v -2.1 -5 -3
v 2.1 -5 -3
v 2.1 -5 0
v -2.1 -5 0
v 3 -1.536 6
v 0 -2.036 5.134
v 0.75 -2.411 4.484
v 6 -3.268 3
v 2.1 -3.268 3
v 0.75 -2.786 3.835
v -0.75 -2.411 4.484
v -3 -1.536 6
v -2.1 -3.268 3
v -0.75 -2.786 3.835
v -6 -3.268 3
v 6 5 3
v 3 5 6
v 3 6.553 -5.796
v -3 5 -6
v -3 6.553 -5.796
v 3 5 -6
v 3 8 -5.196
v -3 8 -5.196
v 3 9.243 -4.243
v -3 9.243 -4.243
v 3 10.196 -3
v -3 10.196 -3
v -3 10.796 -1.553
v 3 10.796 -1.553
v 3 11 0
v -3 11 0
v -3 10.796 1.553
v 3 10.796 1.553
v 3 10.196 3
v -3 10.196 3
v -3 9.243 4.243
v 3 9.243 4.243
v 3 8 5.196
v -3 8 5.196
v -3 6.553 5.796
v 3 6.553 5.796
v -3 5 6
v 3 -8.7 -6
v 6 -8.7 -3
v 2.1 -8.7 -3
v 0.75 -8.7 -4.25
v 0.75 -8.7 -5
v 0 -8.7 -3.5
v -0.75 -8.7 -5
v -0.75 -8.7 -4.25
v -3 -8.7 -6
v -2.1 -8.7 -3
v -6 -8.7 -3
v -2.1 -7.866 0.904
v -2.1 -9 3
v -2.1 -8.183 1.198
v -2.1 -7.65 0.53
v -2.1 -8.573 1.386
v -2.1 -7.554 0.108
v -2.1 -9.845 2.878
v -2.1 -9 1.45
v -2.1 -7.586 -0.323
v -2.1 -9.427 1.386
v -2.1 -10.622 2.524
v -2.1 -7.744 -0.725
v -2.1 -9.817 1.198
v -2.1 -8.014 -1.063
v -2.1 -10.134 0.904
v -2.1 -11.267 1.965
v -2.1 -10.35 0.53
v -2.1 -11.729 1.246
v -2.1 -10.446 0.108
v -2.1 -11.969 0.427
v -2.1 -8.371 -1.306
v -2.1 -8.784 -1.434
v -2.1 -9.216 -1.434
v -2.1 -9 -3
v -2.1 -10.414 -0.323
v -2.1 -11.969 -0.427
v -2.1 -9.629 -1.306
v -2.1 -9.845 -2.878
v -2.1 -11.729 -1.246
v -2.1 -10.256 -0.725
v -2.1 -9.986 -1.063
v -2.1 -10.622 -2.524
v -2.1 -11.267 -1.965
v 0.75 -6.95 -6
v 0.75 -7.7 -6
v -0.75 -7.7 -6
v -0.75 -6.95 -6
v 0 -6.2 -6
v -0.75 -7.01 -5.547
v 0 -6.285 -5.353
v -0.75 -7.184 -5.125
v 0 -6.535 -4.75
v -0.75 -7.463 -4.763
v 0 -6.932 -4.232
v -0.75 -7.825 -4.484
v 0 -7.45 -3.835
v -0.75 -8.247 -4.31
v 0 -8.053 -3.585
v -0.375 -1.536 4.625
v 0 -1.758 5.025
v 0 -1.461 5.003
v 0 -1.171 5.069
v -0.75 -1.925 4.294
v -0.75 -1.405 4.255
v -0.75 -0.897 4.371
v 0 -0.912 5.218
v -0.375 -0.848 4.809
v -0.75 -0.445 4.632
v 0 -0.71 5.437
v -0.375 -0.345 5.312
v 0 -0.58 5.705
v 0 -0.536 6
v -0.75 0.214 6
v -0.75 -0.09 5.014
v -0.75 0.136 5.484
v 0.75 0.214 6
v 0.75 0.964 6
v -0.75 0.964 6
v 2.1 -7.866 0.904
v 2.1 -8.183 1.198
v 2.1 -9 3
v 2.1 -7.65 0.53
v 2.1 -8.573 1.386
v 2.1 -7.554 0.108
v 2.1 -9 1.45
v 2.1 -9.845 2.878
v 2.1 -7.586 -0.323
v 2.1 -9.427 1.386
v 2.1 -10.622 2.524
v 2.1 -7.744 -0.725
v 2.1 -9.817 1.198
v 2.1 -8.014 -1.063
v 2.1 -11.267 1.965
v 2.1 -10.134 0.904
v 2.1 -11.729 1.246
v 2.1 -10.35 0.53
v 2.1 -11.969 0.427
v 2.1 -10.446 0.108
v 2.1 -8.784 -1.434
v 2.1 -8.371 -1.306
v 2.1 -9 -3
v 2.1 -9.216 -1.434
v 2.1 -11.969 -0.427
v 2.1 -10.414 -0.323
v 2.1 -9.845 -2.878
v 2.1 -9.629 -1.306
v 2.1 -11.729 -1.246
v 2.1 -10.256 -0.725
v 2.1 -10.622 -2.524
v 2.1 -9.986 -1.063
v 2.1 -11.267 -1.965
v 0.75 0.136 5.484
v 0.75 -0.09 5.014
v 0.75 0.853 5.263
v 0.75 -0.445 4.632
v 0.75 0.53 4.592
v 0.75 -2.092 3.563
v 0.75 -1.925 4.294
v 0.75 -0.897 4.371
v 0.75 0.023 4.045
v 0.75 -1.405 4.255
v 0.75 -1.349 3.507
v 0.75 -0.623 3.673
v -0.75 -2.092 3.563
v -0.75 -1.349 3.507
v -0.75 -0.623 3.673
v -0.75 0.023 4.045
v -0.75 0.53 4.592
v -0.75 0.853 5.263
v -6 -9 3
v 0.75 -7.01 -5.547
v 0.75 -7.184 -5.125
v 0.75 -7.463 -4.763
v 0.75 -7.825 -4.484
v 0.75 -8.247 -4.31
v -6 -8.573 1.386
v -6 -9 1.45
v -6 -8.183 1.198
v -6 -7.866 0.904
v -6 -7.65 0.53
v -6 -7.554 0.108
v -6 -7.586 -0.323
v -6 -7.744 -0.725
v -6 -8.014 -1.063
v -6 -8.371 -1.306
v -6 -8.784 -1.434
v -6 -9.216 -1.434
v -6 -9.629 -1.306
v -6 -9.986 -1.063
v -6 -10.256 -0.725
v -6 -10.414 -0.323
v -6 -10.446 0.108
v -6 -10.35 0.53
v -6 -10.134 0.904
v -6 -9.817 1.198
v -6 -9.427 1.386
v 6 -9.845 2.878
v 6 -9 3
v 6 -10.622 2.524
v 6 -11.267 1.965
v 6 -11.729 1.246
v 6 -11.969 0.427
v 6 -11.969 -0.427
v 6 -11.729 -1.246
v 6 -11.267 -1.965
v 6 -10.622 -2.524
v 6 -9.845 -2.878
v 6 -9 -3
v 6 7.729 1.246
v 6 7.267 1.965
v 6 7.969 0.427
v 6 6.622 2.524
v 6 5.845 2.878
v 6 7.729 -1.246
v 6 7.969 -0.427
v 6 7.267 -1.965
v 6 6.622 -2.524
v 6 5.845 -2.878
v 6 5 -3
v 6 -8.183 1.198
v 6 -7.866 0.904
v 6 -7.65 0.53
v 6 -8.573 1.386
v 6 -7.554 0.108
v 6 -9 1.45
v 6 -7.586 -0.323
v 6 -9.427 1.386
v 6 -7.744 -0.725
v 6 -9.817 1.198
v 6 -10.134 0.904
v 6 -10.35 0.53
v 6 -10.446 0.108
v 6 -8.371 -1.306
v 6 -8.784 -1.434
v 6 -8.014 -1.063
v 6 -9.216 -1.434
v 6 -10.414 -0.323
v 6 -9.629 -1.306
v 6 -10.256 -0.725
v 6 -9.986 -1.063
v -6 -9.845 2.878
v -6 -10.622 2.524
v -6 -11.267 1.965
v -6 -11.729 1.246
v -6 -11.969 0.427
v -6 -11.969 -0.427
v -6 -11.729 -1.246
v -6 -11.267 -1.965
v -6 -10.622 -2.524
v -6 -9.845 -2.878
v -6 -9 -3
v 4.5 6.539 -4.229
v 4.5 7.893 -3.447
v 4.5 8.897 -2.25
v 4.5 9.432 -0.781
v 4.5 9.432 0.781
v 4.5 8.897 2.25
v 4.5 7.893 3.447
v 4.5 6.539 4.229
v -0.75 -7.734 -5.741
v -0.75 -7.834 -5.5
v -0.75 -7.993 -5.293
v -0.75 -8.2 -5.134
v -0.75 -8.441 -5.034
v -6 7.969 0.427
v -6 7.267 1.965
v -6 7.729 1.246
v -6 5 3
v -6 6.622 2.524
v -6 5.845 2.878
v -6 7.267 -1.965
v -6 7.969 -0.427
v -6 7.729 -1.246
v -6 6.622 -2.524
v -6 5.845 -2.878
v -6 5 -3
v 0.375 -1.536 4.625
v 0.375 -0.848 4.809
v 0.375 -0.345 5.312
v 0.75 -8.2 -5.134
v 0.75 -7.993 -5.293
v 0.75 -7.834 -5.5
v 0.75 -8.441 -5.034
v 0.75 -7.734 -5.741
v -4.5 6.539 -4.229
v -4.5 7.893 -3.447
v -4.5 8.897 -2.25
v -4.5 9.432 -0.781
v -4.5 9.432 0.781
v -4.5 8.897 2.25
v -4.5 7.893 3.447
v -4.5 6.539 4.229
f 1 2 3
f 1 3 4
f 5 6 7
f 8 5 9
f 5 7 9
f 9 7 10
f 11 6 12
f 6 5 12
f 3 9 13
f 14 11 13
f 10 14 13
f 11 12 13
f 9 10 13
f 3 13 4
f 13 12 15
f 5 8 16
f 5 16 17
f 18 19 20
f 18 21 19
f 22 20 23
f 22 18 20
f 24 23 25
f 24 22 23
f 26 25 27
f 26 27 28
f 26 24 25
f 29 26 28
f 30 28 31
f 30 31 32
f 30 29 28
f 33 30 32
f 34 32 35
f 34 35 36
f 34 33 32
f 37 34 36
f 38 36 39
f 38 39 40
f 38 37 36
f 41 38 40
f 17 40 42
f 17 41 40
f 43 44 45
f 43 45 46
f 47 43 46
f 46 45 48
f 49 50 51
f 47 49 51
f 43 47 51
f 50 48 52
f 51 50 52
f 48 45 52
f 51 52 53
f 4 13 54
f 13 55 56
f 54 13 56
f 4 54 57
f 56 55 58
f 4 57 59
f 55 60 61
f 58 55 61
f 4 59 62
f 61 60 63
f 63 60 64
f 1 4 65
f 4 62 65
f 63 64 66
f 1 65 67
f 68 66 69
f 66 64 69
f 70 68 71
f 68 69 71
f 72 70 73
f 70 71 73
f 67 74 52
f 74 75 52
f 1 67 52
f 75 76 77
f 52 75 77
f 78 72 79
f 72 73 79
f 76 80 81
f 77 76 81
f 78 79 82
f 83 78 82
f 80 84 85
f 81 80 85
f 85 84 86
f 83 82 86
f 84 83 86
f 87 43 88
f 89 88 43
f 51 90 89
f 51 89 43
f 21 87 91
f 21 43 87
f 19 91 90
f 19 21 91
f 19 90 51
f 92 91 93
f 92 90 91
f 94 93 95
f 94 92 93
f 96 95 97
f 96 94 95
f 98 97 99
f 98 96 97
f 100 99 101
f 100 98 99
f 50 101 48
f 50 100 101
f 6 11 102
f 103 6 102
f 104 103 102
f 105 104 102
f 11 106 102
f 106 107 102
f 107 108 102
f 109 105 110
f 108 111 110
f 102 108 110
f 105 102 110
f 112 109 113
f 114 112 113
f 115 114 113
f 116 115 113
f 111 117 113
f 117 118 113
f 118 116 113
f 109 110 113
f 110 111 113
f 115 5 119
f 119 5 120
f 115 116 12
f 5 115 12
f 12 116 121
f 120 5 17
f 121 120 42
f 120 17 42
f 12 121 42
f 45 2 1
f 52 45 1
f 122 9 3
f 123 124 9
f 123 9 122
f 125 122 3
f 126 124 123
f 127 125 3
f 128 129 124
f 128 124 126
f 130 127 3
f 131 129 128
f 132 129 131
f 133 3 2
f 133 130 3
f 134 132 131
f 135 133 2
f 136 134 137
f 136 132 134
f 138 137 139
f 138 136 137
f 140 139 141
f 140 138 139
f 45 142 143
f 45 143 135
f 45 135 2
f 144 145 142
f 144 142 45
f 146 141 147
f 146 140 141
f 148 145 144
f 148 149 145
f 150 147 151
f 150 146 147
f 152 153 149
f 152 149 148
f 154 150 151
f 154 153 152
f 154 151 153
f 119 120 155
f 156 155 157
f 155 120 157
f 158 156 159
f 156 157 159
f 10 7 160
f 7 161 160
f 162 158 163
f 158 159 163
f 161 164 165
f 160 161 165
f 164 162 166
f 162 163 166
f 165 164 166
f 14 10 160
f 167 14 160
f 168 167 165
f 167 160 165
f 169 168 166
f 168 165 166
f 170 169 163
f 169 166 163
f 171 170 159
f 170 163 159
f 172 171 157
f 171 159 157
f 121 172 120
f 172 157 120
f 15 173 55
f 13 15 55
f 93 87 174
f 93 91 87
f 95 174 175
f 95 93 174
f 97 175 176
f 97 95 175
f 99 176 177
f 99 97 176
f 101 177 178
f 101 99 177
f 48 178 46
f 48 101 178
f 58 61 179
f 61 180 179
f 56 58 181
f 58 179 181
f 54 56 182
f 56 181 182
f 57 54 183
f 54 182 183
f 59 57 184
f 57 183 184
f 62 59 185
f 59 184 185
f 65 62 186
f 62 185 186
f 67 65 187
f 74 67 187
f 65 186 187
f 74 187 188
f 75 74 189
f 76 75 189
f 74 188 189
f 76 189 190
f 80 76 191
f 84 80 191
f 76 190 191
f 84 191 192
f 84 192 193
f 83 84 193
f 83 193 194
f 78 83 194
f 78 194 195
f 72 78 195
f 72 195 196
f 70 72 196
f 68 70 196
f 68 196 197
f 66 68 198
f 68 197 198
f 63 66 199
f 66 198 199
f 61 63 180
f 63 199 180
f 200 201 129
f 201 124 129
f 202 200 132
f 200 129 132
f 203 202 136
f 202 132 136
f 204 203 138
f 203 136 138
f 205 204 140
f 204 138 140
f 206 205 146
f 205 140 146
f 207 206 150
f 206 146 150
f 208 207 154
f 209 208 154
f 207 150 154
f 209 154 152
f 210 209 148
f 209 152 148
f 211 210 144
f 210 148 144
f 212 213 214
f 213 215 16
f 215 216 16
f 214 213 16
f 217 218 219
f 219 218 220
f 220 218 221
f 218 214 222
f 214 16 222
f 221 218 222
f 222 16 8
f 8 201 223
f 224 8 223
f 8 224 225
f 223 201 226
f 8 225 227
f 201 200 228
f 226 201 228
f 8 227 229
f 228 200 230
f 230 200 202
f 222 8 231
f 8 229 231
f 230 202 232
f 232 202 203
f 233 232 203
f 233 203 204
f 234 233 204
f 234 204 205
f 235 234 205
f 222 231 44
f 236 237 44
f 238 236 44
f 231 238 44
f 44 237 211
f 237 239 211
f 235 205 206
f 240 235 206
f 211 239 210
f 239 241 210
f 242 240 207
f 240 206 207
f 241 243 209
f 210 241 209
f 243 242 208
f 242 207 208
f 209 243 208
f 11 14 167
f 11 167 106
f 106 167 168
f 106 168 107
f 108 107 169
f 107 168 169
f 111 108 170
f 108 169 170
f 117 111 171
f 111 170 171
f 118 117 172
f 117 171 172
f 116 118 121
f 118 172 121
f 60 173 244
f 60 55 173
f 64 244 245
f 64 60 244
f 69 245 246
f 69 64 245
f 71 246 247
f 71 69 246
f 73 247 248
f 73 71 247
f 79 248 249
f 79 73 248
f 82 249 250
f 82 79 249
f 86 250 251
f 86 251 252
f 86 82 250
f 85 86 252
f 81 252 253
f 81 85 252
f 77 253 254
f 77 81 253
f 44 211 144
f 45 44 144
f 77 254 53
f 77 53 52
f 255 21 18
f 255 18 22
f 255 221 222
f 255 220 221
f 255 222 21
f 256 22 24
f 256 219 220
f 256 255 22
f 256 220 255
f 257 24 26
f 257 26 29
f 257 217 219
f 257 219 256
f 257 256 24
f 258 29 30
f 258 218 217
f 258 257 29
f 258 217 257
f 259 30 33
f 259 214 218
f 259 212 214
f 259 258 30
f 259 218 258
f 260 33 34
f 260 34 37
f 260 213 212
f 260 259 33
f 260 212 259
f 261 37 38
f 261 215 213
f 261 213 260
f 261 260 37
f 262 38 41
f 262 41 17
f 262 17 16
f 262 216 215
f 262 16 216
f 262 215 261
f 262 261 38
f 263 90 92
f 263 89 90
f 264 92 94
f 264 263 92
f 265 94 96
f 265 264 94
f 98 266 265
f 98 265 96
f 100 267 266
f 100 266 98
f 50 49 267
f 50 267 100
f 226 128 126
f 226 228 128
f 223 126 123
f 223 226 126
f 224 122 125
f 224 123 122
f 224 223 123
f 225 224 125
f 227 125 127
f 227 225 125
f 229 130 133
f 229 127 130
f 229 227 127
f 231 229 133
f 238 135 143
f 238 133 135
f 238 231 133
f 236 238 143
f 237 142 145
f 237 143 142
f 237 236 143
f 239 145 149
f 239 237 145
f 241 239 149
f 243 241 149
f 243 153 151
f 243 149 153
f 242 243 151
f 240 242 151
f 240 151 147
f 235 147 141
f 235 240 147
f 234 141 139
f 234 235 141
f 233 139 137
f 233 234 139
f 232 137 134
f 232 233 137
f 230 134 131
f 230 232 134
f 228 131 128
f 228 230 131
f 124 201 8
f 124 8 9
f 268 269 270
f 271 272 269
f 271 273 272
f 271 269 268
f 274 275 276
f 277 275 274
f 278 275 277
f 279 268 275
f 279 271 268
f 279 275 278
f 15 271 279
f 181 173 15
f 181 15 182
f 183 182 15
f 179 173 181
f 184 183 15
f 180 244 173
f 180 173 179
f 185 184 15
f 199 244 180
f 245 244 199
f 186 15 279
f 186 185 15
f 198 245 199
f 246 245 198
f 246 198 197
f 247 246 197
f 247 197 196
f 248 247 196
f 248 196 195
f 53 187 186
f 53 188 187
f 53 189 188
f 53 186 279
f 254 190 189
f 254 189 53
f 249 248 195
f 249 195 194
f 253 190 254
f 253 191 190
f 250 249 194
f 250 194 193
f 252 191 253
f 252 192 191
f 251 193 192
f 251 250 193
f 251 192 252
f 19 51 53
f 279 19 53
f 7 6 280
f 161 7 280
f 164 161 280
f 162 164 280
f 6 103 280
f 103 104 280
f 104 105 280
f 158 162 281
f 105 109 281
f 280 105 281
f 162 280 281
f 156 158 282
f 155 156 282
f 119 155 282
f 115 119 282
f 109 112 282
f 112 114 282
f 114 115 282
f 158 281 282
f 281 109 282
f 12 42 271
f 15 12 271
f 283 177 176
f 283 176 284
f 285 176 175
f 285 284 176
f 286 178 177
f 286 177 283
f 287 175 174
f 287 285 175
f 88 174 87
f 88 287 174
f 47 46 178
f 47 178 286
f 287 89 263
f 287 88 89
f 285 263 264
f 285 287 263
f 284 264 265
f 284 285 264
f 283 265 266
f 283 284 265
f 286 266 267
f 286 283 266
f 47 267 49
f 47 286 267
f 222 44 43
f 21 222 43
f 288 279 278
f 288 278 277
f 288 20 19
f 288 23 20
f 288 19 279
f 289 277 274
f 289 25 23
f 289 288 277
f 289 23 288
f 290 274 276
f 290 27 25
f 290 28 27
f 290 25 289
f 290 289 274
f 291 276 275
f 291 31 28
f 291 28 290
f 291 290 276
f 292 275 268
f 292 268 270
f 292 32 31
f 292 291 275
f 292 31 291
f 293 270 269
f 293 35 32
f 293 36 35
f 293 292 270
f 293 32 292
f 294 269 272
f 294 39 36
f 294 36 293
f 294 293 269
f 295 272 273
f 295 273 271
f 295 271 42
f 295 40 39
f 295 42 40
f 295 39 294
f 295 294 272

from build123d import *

# Parameters (mm, degrees)
BOSS_EXTRUDE1_DEPTH     = 5
CUT_EXTRUDE8_DEPTH      = 10.848857802
CUT_EXTRUDE8_DEPTH_BACK = 10.848857802
REVOLVE1_ANGLE          = 180
SKETCH24_W              = 3.9
SKETCH24_H              = 6
BOSS_EXTRUDE2_DEPTH     = 4
SKETCH25_W              = 3.9
SKETCH25_H              = 3
REVOLVE2_ANGLE          = 180
SKETCH26_R              = 1.45
CUT_EXTRUDE9_DEPTH      = 19
BOSS_EXTRUDE4_DEPTH     = 3.7


with BuildPart() as part:
    # Sketch2 → Boss-Extrude1 (new, symmetric)
    with BuildSketch(Plane(origin=(0, 0, 0), x_dir=(1, 0, 0), z_dir=(0, 1, 0))):
        Polygon((-3, 6), (3, 6), (6, 3), (6, -3), (3, -6), (-3, -6), (-6, -3), (-6, 3), align=None)
    extrude(amount=BOSS_EXTRUDE1_DEPTH, both=True)

    # Sketch22 → Cut-Extrude8 (cut, two sides: drawn at the far end of the back side and taken through both)
    with BuildSketch(Plane(origin=(0, 0, 0), x_dir=(0, 0, -1), z_dir=(1, 0, 0)).offset(-CUT_EXTRUDE8_DEPTH_BACK)):
        Polygon((0, -5), (-6, -5), (-6, -1.535898385), align=None)
    extrude(amount=CUT_EXTRUDE8_DEPTH + CUT_EXTRUDE8_DEPTH_BACK, mode=Mode.SUBTRACT)

    # Sketch23 → Revolve1 (revolve)
    with BuildSketch(Plane(origin=(0, 5, 0), x_dir=(1, 0, 0), z_dir=(0, 1, 0))):
        Polygon((-6, 0), (-6, 3), (-3, 6), (3, 6), (6, 3), (6, 0), align=None)
    revolve(axis=Axis((6, 5, 0), (1, 0, 0)), revolution_arc=REVOLVE1_ANGLE)

    # Sketch24 → Boss-Extrude2 (add, symmetric)
    with BuildSketch(Plane.XZ.offset(5)):
        with Locations((-4.05, 0)):
            Rectangle(SKETCH24_W, SKETCH24_H)
    boss_extrude2 = extrude(amount=BOSS_EXTRUDE2_DEPTH, both=True)

    # Sketch25 → Revolve2 (revolve)
    with BuildSketch(Plane.XZ.offset(9)):
        with Locations((-4.05, 1.5)):
            Rectangle(SKETCH25_W, SKETCH25_H)
    revolve2 = revolve(axis=Axis((-6, -9, 0), (1, 0, 0)), revolution_arc=REVOLVE2_ANGLE)

    # Sketch26 → Cut-Extrude9 (cut, symmetric)
    with BuildSketch(Plane.ZY.offset(6)):
        with Locations((0, -9)):
            Circle(SKETCH26_R)
    cut_extrude9 = extrude(amount=CUT_EXTRUDE9_DEPTH, both=True, mode=Mode.SUBTRACT)

    # Mirror1: Boss-Extrude2, Revolve2, Cut-Extrude9 across plane
    add(boss_extrude2.mirror(Plane(origin=(0, 0, 0), x_dir=(0, 0, 1), z_dir=(1, 0, 0))))
    add(revolve2.mirror(Plane(origin=(0, 0, 0), x_dir=(0, 0, 1), z_dir=(1, 0, 0))))
    add(cut_extrude9.mirror(Plane(origin=(0, 0, 0), x_dir=(0, 0, 1), z_dir=(1, 0, 0))), mode=Mode.SUBTRACT)

    # Sketch30 → Cut-Revolve1 (revolve, cut)
    with BuildSketch(Plane(origin=(0, -3.75, 2.165063509), x_dir=(1, 0, 0), z_dir=(0, -0.8660254037844418, 0.49999999999999484))):
        Polygon((0, 3.42820323), (-0.75, 2.67820323), (-0.75, 1.92820323), (0.75, 1.92820323), (0.75, 2.67820323), align=None)
    revolve(axis=Axis((-6, -1.535898385, 6), (1, 0, 0)), mode=Mode.SUBTRACT)

    # Sketch34 → Boss-Extrude4 (add)
    with BuildSketch(Plane.XZ.offset(5)):
        Polygon((-6, -3), (-2.1, -3), (2.1, -3), (6, -3), (3, -6), (-3, -6), align=None)
    extrude(amount=BOSS_EXTRUDE4_DEPTH)

    # Sketch35 → Cut-Revolve3 (revolve, cut)
    with BuildSketch(Plane.XZ.offset(8.7)):
        Polygon((0, -3.5), (-0.75, -4.25), (-0.75, -5), (0.75, -5), (0.75, -4.25), align=None)
    revolve(axis=Axis((3, -8.7, -6), (1, 0, 0)), mode=Mode.SUBTRACT)


solid = part.part
